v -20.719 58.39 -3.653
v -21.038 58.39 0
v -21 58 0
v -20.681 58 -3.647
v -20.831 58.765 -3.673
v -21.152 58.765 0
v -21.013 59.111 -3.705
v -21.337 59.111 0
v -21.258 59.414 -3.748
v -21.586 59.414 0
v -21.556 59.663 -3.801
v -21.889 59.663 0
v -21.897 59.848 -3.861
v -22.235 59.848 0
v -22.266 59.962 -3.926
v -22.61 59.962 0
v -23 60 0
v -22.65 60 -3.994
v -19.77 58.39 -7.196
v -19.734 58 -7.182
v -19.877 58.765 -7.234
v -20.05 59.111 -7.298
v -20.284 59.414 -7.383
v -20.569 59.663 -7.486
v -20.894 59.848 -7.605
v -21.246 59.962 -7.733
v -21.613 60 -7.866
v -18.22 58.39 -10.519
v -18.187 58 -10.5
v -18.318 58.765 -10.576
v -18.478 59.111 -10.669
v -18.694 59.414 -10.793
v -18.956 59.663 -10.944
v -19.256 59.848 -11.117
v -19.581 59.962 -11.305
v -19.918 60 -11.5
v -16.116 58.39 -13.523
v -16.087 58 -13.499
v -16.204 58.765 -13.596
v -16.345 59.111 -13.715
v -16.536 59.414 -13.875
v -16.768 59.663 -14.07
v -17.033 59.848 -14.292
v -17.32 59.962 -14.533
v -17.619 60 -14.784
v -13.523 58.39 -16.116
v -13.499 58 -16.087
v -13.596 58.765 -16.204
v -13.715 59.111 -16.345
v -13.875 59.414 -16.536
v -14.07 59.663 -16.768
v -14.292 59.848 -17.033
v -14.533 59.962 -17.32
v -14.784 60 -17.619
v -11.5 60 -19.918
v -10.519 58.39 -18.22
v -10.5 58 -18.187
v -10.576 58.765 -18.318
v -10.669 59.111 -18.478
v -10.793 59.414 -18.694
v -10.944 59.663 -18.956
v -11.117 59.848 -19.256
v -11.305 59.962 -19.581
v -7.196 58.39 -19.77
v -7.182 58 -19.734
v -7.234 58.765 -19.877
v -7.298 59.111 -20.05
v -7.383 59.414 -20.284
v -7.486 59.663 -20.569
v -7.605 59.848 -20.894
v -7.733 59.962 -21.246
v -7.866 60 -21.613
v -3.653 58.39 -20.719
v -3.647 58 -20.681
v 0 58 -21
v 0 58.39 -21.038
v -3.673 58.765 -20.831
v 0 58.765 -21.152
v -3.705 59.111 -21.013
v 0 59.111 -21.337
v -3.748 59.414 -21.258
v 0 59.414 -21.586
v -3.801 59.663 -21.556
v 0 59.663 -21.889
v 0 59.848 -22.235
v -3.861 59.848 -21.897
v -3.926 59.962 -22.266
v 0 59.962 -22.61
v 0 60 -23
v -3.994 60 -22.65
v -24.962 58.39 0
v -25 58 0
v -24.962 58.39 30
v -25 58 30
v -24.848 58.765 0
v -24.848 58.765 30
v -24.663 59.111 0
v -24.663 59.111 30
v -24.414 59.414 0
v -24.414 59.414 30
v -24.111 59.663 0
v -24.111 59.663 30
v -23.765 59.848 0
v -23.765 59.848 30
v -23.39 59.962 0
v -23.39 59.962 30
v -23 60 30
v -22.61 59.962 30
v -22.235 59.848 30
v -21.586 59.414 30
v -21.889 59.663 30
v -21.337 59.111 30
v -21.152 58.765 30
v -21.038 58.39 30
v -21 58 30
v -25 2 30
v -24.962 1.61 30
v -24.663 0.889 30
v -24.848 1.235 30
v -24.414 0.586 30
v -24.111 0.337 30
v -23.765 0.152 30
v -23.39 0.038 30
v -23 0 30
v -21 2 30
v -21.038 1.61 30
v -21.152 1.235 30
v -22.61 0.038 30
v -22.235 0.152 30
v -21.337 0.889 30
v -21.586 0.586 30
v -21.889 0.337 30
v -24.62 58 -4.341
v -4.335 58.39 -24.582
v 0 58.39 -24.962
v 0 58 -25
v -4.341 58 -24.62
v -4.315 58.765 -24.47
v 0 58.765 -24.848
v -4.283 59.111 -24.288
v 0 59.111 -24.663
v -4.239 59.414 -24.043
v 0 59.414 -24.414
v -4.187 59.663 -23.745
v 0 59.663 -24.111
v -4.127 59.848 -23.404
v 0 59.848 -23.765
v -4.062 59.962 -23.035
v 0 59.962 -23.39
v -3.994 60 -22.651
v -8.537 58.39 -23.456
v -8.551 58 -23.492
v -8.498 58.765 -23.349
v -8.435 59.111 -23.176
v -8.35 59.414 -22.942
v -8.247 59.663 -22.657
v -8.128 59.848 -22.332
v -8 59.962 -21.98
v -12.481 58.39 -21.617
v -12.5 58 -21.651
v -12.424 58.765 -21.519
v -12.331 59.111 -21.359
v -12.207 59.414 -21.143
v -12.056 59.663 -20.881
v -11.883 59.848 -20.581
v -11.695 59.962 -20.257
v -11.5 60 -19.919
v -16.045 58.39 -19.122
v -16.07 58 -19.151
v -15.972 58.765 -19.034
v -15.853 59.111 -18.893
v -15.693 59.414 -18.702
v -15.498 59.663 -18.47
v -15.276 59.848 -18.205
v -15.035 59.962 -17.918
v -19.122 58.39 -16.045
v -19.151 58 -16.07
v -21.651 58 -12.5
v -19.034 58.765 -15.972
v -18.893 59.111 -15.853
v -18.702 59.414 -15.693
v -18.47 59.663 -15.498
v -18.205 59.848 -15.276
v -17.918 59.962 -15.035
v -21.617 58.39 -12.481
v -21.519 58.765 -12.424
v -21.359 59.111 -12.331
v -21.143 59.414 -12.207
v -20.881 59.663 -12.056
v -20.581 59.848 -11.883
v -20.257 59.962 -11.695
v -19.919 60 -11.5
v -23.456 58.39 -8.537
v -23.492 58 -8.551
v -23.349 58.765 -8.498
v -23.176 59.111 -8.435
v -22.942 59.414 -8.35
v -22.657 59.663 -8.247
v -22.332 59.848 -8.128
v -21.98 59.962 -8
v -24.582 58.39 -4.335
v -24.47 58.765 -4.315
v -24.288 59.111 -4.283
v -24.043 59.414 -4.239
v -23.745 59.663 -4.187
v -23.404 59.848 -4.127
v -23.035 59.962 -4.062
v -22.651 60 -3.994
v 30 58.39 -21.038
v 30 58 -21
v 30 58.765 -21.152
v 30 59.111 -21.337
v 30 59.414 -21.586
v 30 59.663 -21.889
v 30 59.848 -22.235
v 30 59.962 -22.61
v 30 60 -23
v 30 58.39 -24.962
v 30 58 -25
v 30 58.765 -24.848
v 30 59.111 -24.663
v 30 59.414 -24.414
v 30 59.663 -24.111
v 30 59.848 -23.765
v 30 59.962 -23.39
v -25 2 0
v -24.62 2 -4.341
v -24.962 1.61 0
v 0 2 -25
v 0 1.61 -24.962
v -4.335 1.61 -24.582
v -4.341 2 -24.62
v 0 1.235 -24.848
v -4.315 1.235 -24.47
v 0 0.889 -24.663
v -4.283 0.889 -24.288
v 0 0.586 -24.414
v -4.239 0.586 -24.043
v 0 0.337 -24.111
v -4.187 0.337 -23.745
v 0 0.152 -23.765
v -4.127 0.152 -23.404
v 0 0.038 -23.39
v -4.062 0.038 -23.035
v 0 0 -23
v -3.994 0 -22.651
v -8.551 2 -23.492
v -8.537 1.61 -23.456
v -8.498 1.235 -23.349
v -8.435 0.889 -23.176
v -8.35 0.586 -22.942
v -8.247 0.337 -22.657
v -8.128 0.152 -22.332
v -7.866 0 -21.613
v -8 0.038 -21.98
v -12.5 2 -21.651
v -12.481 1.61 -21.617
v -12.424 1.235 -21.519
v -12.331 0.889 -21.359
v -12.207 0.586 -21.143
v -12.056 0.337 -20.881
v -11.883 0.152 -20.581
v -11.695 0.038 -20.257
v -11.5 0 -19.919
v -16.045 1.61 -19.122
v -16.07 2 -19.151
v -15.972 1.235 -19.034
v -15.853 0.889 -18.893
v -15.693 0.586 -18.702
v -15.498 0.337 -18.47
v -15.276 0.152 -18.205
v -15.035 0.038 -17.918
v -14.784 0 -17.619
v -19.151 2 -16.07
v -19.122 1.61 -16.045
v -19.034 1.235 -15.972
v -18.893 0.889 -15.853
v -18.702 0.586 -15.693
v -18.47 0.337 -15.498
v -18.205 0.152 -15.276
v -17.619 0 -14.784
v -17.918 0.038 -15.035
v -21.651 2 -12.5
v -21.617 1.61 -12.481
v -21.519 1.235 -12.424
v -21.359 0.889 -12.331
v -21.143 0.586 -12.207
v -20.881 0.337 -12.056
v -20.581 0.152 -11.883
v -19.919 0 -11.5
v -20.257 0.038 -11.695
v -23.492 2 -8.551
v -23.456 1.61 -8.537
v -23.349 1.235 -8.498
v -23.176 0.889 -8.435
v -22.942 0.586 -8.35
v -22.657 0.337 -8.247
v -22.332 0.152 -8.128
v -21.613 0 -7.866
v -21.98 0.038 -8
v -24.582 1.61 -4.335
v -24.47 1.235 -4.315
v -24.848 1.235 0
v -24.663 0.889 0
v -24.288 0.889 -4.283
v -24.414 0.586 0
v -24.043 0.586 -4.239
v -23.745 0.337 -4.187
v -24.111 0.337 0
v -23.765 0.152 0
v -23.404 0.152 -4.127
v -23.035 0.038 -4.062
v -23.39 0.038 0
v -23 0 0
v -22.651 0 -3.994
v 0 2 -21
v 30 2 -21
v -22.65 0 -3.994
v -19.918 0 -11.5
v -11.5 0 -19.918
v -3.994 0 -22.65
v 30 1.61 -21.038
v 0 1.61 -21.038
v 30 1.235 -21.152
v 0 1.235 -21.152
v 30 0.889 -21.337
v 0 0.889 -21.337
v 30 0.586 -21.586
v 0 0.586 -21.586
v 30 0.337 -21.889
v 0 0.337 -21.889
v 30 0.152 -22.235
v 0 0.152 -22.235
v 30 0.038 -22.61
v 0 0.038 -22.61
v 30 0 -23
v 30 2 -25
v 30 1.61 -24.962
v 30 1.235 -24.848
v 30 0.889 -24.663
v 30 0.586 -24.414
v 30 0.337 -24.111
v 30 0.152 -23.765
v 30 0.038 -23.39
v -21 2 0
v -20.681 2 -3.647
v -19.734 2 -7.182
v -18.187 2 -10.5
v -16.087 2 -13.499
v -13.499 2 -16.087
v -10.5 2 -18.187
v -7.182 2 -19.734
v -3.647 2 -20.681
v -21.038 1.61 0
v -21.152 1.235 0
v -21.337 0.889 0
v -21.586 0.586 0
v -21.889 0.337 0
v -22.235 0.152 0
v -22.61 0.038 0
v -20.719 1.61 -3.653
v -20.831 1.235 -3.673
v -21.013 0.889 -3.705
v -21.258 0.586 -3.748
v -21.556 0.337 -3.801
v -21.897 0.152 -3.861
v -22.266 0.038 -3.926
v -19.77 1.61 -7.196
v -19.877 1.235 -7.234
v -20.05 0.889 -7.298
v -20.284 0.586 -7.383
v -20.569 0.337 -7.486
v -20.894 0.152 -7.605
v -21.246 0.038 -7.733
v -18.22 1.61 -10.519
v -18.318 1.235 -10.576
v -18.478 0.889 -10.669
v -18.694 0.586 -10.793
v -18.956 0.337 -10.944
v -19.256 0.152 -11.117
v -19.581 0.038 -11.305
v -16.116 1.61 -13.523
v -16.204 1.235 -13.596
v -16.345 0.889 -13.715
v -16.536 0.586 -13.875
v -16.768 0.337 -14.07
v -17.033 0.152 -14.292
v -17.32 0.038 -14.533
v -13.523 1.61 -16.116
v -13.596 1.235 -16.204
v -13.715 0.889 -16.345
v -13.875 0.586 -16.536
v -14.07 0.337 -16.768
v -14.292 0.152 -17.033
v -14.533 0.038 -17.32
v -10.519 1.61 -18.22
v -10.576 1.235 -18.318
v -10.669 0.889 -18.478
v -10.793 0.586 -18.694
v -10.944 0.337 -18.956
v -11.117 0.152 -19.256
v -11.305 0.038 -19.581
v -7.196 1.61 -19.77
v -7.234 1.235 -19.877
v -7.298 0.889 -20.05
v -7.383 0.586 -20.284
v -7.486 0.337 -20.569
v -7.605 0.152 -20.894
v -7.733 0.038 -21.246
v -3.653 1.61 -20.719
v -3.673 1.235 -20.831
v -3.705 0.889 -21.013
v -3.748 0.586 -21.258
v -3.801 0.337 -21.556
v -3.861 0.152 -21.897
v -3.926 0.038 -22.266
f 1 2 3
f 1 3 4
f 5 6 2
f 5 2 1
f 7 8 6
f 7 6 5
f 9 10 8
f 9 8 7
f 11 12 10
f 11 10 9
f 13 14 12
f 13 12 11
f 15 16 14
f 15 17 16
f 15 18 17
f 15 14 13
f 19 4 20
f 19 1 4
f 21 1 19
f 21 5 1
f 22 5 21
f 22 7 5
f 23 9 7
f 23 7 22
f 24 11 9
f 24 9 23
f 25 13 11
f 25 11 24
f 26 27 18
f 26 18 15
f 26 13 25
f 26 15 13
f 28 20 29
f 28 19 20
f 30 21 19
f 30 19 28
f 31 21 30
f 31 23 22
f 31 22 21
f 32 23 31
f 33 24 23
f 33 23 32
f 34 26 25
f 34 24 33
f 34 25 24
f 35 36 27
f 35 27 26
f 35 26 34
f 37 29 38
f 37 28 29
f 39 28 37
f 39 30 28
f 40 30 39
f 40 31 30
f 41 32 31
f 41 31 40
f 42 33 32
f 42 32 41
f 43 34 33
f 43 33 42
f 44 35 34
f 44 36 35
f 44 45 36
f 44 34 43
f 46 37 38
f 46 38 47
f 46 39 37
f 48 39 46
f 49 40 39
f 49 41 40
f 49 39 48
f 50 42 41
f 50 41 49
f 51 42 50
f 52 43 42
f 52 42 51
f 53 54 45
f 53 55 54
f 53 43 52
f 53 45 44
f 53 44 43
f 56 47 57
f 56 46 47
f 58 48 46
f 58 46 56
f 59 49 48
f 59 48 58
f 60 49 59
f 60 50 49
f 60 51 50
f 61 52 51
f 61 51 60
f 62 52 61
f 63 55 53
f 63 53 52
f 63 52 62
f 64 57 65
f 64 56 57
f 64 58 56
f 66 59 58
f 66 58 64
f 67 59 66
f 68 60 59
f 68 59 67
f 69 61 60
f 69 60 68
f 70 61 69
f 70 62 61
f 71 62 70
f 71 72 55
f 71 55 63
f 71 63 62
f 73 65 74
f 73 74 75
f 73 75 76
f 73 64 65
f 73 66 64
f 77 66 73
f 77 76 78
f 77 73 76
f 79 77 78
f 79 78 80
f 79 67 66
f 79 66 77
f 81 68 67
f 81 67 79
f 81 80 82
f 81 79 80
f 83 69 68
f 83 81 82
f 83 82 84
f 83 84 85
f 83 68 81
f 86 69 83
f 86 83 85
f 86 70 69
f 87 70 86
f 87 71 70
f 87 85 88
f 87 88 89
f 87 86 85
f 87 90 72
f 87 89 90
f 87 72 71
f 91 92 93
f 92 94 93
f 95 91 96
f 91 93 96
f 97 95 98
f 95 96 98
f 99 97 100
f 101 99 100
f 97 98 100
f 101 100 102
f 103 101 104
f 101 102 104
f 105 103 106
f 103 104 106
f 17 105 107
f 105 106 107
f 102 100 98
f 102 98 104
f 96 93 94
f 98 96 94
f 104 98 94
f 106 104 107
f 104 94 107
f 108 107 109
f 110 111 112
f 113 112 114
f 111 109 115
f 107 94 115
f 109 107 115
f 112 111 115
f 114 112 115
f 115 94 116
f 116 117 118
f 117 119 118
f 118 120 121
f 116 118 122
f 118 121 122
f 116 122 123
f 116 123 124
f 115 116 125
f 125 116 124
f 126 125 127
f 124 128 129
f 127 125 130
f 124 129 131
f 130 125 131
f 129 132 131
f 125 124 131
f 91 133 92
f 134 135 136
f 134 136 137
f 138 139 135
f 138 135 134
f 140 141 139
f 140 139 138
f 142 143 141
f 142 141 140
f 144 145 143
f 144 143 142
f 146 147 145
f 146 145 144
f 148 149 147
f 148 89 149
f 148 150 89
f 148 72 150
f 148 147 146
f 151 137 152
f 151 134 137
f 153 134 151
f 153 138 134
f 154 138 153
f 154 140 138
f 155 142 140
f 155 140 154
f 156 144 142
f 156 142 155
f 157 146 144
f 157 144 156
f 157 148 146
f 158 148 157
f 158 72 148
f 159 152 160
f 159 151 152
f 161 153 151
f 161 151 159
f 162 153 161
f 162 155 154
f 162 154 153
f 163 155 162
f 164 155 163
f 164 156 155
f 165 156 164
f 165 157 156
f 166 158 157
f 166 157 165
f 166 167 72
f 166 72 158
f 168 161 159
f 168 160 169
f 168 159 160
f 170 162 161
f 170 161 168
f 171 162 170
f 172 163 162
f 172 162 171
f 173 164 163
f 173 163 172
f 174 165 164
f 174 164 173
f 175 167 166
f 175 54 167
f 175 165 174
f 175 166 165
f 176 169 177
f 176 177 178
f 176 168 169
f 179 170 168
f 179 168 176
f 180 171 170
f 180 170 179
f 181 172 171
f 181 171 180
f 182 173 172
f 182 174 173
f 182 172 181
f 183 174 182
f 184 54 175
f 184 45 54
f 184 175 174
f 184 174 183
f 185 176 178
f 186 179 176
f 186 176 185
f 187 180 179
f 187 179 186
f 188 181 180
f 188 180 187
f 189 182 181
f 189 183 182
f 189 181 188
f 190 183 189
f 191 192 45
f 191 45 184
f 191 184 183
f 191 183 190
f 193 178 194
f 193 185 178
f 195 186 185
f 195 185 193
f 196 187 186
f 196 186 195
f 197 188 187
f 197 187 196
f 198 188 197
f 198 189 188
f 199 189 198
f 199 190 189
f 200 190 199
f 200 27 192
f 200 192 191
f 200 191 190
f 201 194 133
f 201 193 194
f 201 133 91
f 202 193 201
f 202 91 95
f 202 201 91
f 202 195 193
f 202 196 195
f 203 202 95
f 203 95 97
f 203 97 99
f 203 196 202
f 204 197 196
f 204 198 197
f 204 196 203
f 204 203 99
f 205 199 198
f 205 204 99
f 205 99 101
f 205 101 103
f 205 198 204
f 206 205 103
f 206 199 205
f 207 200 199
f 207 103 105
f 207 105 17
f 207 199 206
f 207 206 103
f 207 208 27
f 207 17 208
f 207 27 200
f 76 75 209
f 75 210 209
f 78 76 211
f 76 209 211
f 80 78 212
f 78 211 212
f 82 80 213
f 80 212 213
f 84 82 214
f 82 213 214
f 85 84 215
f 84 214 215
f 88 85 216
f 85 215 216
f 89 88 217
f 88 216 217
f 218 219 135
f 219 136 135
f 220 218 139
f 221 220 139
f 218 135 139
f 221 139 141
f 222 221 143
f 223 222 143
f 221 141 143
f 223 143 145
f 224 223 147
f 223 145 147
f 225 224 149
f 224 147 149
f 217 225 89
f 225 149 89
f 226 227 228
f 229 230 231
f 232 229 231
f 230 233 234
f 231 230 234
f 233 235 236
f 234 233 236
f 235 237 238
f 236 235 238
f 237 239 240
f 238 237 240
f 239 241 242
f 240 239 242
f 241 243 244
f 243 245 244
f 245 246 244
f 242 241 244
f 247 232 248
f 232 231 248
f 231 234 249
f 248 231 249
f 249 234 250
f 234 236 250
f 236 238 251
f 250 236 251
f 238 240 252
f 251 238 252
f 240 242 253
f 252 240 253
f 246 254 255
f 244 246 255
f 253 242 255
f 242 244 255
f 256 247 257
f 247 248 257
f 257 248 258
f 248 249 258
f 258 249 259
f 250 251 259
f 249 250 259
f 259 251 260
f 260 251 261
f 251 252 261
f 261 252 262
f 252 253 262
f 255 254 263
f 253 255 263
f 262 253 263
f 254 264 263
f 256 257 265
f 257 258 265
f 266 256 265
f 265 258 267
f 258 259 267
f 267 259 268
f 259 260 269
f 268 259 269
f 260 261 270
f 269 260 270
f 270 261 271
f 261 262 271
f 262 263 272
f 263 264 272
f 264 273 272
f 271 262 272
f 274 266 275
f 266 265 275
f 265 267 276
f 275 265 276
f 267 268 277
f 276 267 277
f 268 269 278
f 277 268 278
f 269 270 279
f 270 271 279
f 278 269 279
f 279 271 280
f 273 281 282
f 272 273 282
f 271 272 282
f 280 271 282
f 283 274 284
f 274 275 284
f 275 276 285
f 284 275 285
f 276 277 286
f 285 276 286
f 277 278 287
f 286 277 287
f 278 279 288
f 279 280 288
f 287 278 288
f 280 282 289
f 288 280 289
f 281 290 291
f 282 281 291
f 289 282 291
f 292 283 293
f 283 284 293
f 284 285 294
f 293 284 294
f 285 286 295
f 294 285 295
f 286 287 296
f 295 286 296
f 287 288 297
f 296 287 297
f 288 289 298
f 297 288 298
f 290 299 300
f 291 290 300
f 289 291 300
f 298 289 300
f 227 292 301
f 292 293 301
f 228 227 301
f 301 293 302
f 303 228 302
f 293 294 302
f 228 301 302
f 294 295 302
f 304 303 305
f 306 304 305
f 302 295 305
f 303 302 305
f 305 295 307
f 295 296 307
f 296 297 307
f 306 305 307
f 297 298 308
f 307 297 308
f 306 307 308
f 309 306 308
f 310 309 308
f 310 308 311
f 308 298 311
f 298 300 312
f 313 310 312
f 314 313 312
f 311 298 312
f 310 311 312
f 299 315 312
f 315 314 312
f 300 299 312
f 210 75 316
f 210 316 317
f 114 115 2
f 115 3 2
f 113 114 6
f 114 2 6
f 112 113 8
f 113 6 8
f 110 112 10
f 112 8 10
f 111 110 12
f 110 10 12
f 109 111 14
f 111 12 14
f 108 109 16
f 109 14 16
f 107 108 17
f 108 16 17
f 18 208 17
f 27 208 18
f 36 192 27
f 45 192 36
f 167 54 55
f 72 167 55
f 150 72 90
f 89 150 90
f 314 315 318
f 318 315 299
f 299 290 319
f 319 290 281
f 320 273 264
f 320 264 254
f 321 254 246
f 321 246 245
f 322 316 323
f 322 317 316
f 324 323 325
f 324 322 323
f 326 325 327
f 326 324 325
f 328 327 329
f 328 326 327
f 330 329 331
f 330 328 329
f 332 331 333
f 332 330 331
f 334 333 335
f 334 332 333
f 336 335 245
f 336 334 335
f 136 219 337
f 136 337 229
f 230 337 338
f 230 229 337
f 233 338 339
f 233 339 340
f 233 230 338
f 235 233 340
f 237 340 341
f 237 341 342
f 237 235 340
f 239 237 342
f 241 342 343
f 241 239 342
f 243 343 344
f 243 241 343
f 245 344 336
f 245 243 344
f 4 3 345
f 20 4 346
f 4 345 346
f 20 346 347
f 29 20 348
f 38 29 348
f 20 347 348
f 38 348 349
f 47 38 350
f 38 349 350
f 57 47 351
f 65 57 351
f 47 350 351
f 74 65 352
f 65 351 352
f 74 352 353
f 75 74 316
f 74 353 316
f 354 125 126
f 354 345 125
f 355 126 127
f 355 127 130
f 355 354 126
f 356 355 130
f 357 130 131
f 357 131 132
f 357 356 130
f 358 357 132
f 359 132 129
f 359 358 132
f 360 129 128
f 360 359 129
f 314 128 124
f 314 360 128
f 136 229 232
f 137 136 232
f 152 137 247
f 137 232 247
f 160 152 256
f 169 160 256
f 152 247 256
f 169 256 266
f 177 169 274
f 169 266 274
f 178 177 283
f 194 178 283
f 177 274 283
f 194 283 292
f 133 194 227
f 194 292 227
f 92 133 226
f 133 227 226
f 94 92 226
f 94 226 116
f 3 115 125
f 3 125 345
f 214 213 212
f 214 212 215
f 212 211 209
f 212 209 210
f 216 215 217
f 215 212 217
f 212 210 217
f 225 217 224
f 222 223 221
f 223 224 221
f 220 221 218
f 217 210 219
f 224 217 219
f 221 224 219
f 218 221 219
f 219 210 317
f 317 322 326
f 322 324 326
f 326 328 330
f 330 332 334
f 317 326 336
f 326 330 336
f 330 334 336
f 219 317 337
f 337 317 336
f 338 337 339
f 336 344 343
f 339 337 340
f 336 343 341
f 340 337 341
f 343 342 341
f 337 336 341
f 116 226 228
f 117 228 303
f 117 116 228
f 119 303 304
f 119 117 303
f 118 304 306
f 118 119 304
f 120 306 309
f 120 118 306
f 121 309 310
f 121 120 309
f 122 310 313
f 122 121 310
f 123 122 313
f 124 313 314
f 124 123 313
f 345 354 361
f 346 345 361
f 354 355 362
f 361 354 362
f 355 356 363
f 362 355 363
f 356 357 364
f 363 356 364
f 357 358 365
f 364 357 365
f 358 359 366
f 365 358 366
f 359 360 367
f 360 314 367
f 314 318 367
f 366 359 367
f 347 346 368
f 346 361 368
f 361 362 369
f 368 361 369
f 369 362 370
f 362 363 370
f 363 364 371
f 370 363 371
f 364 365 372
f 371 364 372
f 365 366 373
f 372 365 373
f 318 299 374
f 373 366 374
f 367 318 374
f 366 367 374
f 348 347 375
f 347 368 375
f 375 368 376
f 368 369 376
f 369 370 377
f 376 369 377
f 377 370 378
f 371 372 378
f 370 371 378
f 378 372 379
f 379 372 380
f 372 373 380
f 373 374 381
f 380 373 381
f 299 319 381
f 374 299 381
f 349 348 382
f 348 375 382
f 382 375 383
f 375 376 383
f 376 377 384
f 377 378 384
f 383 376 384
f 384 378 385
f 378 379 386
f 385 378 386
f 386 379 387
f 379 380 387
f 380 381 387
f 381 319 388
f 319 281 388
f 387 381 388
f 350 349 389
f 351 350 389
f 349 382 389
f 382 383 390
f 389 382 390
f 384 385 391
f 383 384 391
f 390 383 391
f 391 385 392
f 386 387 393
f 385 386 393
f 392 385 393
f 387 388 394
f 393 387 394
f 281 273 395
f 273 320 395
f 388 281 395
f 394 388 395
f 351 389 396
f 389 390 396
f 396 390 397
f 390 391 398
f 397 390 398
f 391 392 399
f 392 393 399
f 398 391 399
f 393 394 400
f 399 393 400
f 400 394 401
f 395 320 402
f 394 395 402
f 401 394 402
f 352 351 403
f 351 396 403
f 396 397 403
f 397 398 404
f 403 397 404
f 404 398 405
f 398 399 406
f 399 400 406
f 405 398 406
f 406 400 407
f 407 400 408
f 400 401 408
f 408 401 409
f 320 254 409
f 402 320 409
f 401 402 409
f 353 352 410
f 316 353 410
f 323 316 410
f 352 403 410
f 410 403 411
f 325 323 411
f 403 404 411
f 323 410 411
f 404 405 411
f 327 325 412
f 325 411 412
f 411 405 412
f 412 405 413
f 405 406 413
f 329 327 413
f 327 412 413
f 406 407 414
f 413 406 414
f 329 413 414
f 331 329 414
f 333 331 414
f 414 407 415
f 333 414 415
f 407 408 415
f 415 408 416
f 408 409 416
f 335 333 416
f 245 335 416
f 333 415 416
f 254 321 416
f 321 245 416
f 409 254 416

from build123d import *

# Parameters (mm, degrees)
BOSS_EXTRUDE1_DEPTH = 60
FILLET1_R           = 2


with BuildPart() as part:
    # Sketch1 → Boss-Extrude1 (new body)
    with BuildSketch(Plane(origin=(0, 0, 0), x_dir=(1, 0, 0), z_dir=(0, 1, 0))):
        with BuildLine():
            Line((-25, 0), (-25, -15))
            Line((-25, -15), (-25, -30))
            Line((-25, -30), (-21, -30))
            Line((-21, -30), (-21, -15))
            Line((-21, -15), (-21, 0))
            ThreePointArc((-21, 0), (-14.849242405, 14.849242405), (0, 21))
            Line((0, 21), (15, 21))
            Line((15, 21), (30, 21))
            Line((30, 21), (30, 25))
            Line((30, 25), (15, 25))
            Line((15, 25), (0, 25))
            ThreePointArc((0, 25), (-17.67766953, 17.67766953), (-25, 0))
        make_face()
    extrude(amount=BOSS_EXTRUDE1_DEPTH)

    # Fillet1
    fillet1_edges = [part.edges().sort_by_distance(p)[0] for p in [
        (15, 0, -25),
        (-25, 0, 15),
        (-21, 0, 15),
        (15, 0, -21),
        (15, 60, -25),
        (-25, 60, 15),
        (-21, 60, 15),
        (15, 60, -21),
        (-17.67766953, 0, -17.67766953),
        (-14.849242405, 0, -14.849242405),
        (-17.67766953, 60, -17.67766953),
        (-14.849242405, 60, -14.849242405),
    ]]
    fillet(fillet1_edges, radius=FILLET1_R - 0.0001)  # a hair under: the kernel refuses the full size


solid = part.part
